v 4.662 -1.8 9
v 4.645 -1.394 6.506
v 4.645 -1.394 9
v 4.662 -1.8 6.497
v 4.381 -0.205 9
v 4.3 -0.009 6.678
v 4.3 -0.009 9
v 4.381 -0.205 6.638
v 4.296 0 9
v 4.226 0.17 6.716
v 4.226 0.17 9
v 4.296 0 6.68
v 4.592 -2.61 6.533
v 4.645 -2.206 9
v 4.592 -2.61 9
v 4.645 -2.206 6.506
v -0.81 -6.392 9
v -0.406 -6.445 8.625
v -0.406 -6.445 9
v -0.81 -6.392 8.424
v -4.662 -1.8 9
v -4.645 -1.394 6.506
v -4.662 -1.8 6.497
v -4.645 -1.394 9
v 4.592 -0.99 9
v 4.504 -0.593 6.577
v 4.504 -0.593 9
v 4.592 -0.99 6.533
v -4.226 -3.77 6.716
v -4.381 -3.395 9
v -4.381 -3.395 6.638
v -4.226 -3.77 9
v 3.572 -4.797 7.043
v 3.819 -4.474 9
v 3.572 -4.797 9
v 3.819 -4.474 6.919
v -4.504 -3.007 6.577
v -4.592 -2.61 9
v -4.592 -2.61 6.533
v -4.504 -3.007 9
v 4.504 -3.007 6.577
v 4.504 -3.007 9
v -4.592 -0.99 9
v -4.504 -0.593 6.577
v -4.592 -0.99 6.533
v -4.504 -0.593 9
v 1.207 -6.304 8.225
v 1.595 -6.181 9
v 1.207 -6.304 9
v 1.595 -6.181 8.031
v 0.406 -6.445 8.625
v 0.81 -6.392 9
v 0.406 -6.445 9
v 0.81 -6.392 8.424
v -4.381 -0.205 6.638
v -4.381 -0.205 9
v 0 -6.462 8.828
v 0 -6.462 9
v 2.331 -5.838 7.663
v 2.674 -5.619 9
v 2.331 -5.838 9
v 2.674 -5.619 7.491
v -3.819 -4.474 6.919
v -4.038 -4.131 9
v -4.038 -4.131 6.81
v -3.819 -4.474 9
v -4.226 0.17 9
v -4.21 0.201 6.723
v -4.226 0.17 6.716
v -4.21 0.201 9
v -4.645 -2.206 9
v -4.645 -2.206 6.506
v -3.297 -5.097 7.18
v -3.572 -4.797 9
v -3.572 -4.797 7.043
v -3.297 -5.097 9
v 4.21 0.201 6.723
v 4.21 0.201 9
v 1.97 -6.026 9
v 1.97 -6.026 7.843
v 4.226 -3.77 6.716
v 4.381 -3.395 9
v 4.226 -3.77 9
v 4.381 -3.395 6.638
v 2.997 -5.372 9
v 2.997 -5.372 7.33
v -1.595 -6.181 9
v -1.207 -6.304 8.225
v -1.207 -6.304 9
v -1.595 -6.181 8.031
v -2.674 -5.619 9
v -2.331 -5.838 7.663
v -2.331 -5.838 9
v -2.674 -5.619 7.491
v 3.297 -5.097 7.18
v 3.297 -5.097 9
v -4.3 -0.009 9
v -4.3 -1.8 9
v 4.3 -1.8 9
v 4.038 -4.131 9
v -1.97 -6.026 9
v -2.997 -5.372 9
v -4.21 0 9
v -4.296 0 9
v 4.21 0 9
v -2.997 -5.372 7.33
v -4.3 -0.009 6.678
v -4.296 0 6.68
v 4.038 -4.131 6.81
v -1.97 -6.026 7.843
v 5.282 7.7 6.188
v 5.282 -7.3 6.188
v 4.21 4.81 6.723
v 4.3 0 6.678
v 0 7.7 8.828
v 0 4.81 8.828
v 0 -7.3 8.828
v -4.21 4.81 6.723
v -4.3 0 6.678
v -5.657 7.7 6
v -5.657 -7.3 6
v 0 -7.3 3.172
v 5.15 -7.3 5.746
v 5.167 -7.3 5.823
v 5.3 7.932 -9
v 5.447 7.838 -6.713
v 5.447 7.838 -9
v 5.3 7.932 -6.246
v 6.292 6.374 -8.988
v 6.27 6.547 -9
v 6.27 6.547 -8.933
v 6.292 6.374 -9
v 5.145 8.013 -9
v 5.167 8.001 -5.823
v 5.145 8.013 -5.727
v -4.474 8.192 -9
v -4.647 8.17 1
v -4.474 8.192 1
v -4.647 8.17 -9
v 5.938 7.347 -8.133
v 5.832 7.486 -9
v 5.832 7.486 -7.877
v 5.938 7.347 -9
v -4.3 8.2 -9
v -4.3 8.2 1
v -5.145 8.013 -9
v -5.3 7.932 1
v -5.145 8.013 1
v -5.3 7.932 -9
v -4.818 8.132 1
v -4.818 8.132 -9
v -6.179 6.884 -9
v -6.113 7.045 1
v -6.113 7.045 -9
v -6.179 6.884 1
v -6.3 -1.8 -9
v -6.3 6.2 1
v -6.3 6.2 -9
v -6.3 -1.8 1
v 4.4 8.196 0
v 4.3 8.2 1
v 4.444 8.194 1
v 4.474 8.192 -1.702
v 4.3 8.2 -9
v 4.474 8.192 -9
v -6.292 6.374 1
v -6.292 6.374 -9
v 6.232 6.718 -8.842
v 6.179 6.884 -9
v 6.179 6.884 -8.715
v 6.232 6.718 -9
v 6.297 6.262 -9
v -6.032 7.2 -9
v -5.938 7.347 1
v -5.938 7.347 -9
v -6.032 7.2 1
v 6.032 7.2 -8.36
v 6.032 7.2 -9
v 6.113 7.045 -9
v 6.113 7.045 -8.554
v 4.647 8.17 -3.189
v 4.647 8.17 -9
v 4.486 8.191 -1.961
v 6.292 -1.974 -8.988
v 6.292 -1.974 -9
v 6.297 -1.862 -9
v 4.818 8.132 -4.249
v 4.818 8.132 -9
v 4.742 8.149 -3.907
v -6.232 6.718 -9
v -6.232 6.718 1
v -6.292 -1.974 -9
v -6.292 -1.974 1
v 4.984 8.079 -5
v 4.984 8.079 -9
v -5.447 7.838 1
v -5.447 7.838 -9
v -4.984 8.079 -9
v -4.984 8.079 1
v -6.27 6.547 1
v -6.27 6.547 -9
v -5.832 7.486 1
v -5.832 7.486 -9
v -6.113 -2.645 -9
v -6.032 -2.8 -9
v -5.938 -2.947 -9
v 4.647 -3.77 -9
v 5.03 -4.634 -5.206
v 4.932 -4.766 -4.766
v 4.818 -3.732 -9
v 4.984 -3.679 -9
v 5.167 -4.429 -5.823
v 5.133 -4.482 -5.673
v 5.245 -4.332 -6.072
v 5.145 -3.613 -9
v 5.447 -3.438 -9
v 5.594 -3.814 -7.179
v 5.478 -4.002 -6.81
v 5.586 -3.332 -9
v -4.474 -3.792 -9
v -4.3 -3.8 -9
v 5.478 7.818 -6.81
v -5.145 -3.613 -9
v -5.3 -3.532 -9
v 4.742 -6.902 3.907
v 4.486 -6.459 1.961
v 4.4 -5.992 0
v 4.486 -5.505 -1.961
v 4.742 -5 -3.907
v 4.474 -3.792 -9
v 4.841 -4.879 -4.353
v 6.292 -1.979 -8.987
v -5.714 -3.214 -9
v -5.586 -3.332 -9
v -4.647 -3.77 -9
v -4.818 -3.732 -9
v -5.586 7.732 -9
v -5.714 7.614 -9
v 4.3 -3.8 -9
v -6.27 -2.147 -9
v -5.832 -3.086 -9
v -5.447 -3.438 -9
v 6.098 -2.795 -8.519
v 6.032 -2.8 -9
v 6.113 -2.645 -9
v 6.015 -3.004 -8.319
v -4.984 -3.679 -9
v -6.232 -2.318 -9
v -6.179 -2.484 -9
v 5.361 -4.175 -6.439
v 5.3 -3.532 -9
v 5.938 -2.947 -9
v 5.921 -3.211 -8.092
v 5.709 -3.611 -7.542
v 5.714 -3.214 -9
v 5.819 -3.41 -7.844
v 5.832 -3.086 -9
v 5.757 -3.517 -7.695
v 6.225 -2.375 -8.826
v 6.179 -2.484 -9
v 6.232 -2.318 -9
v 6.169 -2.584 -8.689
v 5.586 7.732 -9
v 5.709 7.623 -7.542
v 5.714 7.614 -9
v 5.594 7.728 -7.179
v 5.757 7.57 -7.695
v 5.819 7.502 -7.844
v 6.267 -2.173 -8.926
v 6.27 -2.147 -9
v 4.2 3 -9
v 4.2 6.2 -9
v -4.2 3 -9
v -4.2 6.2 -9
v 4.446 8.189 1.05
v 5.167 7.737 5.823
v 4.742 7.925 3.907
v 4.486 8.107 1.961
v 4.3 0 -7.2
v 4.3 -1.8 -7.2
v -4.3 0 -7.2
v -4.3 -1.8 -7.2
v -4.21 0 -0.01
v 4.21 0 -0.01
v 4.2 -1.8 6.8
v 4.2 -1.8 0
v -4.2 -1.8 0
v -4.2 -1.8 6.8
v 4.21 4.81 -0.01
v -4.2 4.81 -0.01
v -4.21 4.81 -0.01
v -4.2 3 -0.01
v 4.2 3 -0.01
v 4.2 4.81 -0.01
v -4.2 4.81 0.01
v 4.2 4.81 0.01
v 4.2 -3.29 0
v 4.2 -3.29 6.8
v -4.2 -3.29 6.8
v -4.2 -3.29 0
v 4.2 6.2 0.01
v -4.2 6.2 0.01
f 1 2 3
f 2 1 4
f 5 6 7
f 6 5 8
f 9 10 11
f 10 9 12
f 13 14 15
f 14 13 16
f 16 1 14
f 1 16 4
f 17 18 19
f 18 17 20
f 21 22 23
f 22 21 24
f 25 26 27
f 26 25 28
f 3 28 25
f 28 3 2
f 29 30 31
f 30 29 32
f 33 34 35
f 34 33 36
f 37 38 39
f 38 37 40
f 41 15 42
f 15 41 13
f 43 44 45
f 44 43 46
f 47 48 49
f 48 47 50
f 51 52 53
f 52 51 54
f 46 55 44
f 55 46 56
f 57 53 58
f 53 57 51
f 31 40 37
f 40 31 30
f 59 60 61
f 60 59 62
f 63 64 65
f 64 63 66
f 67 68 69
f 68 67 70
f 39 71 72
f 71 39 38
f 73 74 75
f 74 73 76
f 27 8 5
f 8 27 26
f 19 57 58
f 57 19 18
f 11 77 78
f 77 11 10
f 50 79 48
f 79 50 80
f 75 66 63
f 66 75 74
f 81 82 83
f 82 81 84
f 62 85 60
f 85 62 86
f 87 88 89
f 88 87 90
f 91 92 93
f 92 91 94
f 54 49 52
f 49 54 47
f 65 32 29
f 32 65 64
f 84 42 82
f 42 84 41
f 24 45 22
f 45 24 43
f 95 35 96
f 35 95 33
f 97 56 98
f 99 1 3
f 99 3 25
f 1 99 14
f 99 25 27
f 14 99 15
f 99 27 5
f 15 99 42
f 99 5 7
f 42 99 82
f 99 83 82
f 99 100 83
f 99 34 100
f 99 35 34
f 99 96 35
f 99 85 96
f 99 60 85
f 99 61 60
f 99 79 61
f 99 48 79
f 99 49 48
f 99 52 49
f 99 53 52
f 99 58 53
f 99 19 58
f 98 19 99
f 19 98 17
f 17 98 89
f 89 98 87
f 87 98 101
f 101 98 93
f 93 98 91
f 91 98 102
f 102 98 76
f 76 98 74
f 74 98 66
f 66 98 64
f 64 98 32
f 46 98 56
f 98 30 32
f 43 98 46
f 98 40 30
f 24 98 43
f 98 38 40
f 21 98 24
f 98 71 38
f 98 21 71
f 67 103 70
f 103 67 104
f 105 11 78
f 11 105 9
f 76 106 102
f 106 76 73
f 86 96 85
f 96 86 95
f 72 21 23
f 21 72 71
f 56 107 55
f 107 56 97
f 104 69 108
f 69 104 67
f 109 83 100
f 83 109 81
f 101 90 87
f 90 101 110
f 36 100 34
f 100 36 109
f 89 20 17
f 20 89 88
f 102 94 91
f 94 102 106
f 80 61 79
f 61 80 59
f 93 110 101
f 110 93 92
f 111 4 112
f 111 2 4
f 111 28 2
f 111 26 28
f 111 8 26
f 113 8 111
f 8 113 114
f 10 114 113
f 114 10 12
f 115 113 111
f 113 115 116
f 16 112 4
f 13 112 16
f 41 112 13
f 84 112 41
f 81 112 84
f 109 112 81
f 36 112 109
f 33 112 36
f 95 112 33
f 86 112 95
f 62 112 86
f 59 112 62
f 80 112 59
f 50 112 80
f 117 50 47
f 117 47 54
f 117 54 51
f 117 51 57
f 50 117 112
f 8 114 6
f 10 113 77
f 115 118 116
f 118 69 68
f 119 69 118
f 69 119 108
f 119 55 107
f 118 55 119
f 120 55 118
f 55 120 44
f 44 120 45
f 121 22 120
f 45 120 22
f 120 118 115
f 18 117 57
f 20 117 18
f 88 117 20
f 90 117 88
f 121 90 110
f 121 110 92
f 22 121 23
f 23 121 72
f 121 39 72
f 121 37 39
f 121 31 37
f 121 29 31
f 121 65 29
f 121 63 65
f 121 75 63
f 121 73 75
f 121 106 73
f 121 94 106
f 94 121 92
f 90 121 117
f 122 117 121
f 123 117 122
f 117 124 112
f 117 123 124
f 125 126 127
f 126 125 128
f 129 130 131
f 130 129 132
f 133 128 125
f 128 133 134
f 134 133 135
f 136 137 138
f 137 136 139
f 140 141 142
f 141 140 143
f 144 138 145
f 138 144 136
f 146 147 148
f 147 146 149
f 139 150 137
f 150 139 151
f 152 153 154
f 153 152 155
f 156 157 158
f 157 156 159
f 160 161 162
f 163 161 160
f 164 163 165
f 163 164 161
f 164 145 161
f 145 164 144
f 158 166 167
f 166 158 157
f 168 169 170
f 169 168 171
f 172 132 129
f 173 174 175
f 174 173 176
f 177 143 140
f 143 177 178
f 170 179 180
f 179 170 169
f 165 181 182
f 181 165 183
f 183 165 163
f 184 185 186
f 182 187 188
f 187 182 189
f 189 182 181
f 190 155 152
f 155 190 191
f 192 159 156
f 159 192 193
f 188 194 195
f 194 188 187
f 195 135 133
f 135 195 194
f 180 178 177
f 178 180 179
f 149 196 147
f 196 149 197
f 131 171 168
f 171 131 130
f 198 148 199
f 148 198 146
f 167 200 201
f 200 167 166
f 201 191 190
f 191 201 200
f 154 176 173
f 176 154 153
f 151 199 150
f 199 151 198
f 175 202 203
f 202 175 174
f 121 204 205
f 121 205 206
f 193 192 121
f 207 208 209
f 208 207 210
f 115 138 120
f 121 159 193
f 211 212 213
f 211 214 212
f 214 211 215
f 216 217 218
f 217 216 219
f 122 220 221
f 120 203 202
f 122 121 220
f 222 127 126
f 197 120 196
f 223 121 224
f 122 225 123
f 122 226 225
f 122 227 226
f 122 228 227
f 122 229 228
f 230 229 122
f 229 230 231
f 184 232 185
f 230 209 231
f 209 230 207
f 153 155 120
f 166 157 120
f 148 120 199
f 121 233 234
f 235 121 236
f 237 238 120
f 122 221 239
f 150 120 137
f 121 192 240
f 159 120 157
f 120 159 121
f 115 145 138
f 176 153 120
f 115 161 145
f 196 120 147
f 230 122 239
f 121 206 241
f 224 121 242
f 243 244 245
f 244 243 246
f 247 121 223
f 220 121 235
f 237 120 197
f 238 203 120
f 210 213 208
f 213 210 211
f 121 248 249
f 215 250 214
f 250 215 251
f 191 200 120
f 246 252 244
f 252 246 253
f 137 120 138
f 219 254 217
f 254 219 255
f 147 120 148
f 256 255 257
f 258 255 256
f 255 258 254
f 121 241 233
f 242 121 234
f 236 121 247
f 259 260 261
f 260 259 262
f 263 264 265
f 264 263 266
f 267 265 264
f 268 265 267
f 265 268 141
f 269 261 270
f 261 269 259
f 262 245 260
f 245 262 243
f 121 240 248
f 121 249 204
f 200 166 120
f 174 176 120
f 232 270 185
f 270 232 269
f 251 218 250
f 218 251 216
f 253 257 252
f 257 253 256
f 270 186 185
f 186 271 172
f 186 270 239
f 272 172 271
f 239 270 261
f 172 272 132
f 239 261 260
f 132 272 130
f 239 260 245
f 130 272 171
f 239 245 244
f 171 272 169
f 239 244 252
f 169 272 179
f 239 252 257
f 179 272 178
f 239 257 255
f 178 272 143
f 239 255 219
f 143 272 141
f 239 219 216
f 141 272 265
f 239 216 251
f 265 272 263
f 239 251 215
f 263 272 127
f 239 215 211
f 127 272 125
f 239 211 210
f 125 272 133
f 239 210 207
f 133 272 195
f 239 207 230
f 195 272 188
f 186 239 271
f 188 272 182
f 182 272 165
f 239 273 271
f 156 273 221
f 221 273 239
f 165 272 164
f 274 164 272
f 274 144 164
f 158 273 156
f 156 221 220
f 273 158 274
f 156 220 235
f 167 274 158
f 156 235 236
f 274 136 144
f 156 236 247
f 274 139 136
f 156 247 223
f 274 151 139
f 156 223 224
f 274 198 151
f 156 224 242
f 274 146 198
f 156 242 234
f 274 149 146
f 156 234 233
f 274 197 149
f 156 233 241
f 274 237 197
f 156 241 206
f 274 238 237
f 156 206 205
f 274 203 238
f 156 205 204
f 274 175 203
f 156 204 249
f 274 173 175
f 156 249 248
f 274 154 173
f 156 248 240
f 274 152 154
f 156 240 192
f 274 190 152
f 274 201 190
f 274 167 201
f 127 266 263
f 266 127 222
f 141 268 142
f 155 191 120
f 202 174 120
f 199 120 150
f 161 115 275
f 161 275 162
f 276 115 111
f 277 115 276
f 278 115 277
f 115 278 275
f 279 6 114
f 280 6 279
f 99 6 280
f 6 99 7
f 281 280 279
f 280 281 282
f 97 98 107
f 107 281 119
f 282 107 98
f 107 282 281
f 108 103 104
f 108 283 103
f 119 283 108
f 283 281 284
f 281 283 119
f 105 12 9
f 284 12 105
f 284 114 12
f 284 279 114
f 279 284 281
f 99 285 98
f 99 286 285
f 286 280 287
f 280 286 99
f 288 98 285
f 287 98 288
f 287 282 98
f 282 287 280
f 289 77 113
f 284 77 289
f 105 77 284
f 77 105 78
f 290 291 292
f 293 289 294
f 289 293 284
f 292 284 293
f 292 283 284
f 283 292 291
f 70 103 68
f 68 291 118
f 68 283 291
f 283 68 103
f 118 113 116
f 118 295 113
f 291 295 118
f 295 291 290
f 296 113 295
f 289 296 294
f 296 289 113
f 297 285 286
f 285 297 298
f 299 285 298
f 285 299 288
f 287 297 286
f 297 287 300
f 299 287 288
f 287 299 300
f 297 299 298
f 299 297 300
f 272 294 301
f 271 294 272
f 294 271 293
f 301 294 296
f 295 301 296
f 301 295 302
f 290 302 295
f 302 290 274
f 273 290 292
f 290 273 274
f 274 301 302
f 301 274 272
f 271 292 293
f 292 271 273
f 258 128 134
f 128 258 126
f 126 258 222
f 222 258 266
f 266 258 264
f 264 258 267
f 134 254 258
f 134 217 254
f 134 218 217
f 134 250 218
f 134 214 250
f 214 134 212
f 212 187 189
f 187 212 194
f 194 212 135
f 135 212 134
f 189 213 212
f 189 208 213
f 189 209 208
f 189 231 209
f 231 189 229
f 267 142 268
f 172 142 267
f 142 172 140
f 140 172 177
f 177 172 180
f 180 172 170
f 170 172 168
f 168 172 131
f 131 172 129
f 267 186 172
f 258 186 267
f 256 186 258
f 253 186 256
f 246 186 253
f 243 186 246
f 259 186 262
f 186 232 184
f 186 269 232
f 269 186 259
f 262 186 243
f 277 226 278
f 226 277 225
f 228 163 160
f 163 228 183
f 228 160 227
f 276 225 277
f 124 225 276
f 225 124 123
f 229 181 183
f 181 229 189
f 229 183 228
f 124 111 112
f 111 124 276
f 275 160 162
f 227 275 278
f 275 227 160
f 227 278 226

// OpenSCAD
/*
	Guard for encoder board

*/
$fs=0.1;
$fa=5;

inch=25.4;

wall=2;

clearance_lo=0.2; // around clean precise things
clearance_hi=0.4; // around lumpy things like solder or board edges

// Circuit board stub
circuit_thick=1.6+clearance_lo;
circuit_wide=8.2+clearance_hi;
circuit_deep=6.8+clearance_hi;

// Actual 3-pin plug
wire_wide=8+clearance_hi;
wire_thick=2.8+clearance_hi;
wire_ystart=3.0;
wire_deep=9;

// 3-pin male header soldered to circuit board
soldertop_thick=4.6+clearance_lo;
soldertop_deep=5;
solderbot_thick=1.5;
solderbot_deep=circuit_deep-0.4;

// Mounted into a 3/8" hole in the motor housing
thruhole_dia=0.375*inch-clearance_lo;
thruhole_tilt=0;
thruhole_insert=3;
thruhole_deep=6;  // start point of thruhole, relative to end of wires

motormount_dia=45; // motor mount on left side

epsilon=0.01;


module thruhole_orient() {
	translate([0,-circuit_thick,thruhole_deep])
	rotate([0,thruhole_tilt,0])
		children();
}

module thruhole_bevelarea() {
	/* // Round version: 
	f=2;
	scale([1,1,-1])
		cylinder(d1=thruhole_dia+2*f,d2=thruhole_dia,h=f);
	*/
	
	// Squared off version
	translate([0,2,0])
	scale([1,1,0.5])
		rotate([0,45,0])
			cube([8,15,8],center=true);
	
}

module guard_bottom_2D() {
	offset(r=wall)
	union() {
		//scale([0.7,1.0])
		//	circle(d=thruhole_dia);
		
		translate([-circuit_wide/2,-circuit_thick])
			square([circuit_wide,circuit_thick+wire_ystart+wire_thick]);
	}
	
}

module circuitboard() {
	color([1,1,0.2])
	translate([-circuit_wide/2,-circuit_thick,-circuit_deep])
		cube([circuit_wide,circuit_thick,1.5*inch]);
}

module guard_holes() {
	// Actual PCB
	circuitboard();
	
	// Space for hot glue and 3-pin header topside pins
	color([0.1,0.1,0.1])
	translate([-wire_wide/2-epsilon,-epsilon,-epsilon])
		cube([wire_wide+2*epsilon,soldertop_thick+2*epsilon,soldertop_deep+10]);
	
	// Space for solder bumps underneath
	color([0.5,0.5,0.5])
	translate([-wire_wide/2,-circuit_thick-solderbot_thick+epsilon,0])
		cube([wire_wide,solderbot_thick,solderbot_deep]);
	
	// Space for 3-pin wire end to plug in
	color([1.0,0.1,0.1])
	translate([-wire_wide/2,wire_ystart,-wire_deep-epsilon])
		cube([wire_wide,wire_thick,wire_deep+2*epsilon]);
}

module guard_plus() {
	// Bottom body of guard
	translate([0,0,-wire_deep+0.01])
		linear_extrude(height=wire_deep)
			guard_bottom_2D();
	
	// Guard to thruhole transition
	hull() {
		for (z=[0,-wire_deep])
			translate([0,0,z])
				linear_extrude(height=1)
					guard_bottom_2D();
		thruhole_orient() thruhole_bevelarea();
	}	
	
	
	// Sloped plug for thruhole
	thruhole_orient()
	union() {
		cylinder(d=thruhole_dia,h=thruhole_insert);
		thruhole_bevelarea();
	}
	
}

difference() {
	guard_plus();
	guard_holes();
	
	translate([motormount_dia/2+circuit_wide/2+0.1,0,0])
		rotate([90,0,0])
			cylinder(d=motormount_dia,h=100,center=true,$fs=0.1,$fa=5);
	
	// Cutaway:
	// translate([1000,0,0]) cube([2000,2000,2000],center=true);
}
